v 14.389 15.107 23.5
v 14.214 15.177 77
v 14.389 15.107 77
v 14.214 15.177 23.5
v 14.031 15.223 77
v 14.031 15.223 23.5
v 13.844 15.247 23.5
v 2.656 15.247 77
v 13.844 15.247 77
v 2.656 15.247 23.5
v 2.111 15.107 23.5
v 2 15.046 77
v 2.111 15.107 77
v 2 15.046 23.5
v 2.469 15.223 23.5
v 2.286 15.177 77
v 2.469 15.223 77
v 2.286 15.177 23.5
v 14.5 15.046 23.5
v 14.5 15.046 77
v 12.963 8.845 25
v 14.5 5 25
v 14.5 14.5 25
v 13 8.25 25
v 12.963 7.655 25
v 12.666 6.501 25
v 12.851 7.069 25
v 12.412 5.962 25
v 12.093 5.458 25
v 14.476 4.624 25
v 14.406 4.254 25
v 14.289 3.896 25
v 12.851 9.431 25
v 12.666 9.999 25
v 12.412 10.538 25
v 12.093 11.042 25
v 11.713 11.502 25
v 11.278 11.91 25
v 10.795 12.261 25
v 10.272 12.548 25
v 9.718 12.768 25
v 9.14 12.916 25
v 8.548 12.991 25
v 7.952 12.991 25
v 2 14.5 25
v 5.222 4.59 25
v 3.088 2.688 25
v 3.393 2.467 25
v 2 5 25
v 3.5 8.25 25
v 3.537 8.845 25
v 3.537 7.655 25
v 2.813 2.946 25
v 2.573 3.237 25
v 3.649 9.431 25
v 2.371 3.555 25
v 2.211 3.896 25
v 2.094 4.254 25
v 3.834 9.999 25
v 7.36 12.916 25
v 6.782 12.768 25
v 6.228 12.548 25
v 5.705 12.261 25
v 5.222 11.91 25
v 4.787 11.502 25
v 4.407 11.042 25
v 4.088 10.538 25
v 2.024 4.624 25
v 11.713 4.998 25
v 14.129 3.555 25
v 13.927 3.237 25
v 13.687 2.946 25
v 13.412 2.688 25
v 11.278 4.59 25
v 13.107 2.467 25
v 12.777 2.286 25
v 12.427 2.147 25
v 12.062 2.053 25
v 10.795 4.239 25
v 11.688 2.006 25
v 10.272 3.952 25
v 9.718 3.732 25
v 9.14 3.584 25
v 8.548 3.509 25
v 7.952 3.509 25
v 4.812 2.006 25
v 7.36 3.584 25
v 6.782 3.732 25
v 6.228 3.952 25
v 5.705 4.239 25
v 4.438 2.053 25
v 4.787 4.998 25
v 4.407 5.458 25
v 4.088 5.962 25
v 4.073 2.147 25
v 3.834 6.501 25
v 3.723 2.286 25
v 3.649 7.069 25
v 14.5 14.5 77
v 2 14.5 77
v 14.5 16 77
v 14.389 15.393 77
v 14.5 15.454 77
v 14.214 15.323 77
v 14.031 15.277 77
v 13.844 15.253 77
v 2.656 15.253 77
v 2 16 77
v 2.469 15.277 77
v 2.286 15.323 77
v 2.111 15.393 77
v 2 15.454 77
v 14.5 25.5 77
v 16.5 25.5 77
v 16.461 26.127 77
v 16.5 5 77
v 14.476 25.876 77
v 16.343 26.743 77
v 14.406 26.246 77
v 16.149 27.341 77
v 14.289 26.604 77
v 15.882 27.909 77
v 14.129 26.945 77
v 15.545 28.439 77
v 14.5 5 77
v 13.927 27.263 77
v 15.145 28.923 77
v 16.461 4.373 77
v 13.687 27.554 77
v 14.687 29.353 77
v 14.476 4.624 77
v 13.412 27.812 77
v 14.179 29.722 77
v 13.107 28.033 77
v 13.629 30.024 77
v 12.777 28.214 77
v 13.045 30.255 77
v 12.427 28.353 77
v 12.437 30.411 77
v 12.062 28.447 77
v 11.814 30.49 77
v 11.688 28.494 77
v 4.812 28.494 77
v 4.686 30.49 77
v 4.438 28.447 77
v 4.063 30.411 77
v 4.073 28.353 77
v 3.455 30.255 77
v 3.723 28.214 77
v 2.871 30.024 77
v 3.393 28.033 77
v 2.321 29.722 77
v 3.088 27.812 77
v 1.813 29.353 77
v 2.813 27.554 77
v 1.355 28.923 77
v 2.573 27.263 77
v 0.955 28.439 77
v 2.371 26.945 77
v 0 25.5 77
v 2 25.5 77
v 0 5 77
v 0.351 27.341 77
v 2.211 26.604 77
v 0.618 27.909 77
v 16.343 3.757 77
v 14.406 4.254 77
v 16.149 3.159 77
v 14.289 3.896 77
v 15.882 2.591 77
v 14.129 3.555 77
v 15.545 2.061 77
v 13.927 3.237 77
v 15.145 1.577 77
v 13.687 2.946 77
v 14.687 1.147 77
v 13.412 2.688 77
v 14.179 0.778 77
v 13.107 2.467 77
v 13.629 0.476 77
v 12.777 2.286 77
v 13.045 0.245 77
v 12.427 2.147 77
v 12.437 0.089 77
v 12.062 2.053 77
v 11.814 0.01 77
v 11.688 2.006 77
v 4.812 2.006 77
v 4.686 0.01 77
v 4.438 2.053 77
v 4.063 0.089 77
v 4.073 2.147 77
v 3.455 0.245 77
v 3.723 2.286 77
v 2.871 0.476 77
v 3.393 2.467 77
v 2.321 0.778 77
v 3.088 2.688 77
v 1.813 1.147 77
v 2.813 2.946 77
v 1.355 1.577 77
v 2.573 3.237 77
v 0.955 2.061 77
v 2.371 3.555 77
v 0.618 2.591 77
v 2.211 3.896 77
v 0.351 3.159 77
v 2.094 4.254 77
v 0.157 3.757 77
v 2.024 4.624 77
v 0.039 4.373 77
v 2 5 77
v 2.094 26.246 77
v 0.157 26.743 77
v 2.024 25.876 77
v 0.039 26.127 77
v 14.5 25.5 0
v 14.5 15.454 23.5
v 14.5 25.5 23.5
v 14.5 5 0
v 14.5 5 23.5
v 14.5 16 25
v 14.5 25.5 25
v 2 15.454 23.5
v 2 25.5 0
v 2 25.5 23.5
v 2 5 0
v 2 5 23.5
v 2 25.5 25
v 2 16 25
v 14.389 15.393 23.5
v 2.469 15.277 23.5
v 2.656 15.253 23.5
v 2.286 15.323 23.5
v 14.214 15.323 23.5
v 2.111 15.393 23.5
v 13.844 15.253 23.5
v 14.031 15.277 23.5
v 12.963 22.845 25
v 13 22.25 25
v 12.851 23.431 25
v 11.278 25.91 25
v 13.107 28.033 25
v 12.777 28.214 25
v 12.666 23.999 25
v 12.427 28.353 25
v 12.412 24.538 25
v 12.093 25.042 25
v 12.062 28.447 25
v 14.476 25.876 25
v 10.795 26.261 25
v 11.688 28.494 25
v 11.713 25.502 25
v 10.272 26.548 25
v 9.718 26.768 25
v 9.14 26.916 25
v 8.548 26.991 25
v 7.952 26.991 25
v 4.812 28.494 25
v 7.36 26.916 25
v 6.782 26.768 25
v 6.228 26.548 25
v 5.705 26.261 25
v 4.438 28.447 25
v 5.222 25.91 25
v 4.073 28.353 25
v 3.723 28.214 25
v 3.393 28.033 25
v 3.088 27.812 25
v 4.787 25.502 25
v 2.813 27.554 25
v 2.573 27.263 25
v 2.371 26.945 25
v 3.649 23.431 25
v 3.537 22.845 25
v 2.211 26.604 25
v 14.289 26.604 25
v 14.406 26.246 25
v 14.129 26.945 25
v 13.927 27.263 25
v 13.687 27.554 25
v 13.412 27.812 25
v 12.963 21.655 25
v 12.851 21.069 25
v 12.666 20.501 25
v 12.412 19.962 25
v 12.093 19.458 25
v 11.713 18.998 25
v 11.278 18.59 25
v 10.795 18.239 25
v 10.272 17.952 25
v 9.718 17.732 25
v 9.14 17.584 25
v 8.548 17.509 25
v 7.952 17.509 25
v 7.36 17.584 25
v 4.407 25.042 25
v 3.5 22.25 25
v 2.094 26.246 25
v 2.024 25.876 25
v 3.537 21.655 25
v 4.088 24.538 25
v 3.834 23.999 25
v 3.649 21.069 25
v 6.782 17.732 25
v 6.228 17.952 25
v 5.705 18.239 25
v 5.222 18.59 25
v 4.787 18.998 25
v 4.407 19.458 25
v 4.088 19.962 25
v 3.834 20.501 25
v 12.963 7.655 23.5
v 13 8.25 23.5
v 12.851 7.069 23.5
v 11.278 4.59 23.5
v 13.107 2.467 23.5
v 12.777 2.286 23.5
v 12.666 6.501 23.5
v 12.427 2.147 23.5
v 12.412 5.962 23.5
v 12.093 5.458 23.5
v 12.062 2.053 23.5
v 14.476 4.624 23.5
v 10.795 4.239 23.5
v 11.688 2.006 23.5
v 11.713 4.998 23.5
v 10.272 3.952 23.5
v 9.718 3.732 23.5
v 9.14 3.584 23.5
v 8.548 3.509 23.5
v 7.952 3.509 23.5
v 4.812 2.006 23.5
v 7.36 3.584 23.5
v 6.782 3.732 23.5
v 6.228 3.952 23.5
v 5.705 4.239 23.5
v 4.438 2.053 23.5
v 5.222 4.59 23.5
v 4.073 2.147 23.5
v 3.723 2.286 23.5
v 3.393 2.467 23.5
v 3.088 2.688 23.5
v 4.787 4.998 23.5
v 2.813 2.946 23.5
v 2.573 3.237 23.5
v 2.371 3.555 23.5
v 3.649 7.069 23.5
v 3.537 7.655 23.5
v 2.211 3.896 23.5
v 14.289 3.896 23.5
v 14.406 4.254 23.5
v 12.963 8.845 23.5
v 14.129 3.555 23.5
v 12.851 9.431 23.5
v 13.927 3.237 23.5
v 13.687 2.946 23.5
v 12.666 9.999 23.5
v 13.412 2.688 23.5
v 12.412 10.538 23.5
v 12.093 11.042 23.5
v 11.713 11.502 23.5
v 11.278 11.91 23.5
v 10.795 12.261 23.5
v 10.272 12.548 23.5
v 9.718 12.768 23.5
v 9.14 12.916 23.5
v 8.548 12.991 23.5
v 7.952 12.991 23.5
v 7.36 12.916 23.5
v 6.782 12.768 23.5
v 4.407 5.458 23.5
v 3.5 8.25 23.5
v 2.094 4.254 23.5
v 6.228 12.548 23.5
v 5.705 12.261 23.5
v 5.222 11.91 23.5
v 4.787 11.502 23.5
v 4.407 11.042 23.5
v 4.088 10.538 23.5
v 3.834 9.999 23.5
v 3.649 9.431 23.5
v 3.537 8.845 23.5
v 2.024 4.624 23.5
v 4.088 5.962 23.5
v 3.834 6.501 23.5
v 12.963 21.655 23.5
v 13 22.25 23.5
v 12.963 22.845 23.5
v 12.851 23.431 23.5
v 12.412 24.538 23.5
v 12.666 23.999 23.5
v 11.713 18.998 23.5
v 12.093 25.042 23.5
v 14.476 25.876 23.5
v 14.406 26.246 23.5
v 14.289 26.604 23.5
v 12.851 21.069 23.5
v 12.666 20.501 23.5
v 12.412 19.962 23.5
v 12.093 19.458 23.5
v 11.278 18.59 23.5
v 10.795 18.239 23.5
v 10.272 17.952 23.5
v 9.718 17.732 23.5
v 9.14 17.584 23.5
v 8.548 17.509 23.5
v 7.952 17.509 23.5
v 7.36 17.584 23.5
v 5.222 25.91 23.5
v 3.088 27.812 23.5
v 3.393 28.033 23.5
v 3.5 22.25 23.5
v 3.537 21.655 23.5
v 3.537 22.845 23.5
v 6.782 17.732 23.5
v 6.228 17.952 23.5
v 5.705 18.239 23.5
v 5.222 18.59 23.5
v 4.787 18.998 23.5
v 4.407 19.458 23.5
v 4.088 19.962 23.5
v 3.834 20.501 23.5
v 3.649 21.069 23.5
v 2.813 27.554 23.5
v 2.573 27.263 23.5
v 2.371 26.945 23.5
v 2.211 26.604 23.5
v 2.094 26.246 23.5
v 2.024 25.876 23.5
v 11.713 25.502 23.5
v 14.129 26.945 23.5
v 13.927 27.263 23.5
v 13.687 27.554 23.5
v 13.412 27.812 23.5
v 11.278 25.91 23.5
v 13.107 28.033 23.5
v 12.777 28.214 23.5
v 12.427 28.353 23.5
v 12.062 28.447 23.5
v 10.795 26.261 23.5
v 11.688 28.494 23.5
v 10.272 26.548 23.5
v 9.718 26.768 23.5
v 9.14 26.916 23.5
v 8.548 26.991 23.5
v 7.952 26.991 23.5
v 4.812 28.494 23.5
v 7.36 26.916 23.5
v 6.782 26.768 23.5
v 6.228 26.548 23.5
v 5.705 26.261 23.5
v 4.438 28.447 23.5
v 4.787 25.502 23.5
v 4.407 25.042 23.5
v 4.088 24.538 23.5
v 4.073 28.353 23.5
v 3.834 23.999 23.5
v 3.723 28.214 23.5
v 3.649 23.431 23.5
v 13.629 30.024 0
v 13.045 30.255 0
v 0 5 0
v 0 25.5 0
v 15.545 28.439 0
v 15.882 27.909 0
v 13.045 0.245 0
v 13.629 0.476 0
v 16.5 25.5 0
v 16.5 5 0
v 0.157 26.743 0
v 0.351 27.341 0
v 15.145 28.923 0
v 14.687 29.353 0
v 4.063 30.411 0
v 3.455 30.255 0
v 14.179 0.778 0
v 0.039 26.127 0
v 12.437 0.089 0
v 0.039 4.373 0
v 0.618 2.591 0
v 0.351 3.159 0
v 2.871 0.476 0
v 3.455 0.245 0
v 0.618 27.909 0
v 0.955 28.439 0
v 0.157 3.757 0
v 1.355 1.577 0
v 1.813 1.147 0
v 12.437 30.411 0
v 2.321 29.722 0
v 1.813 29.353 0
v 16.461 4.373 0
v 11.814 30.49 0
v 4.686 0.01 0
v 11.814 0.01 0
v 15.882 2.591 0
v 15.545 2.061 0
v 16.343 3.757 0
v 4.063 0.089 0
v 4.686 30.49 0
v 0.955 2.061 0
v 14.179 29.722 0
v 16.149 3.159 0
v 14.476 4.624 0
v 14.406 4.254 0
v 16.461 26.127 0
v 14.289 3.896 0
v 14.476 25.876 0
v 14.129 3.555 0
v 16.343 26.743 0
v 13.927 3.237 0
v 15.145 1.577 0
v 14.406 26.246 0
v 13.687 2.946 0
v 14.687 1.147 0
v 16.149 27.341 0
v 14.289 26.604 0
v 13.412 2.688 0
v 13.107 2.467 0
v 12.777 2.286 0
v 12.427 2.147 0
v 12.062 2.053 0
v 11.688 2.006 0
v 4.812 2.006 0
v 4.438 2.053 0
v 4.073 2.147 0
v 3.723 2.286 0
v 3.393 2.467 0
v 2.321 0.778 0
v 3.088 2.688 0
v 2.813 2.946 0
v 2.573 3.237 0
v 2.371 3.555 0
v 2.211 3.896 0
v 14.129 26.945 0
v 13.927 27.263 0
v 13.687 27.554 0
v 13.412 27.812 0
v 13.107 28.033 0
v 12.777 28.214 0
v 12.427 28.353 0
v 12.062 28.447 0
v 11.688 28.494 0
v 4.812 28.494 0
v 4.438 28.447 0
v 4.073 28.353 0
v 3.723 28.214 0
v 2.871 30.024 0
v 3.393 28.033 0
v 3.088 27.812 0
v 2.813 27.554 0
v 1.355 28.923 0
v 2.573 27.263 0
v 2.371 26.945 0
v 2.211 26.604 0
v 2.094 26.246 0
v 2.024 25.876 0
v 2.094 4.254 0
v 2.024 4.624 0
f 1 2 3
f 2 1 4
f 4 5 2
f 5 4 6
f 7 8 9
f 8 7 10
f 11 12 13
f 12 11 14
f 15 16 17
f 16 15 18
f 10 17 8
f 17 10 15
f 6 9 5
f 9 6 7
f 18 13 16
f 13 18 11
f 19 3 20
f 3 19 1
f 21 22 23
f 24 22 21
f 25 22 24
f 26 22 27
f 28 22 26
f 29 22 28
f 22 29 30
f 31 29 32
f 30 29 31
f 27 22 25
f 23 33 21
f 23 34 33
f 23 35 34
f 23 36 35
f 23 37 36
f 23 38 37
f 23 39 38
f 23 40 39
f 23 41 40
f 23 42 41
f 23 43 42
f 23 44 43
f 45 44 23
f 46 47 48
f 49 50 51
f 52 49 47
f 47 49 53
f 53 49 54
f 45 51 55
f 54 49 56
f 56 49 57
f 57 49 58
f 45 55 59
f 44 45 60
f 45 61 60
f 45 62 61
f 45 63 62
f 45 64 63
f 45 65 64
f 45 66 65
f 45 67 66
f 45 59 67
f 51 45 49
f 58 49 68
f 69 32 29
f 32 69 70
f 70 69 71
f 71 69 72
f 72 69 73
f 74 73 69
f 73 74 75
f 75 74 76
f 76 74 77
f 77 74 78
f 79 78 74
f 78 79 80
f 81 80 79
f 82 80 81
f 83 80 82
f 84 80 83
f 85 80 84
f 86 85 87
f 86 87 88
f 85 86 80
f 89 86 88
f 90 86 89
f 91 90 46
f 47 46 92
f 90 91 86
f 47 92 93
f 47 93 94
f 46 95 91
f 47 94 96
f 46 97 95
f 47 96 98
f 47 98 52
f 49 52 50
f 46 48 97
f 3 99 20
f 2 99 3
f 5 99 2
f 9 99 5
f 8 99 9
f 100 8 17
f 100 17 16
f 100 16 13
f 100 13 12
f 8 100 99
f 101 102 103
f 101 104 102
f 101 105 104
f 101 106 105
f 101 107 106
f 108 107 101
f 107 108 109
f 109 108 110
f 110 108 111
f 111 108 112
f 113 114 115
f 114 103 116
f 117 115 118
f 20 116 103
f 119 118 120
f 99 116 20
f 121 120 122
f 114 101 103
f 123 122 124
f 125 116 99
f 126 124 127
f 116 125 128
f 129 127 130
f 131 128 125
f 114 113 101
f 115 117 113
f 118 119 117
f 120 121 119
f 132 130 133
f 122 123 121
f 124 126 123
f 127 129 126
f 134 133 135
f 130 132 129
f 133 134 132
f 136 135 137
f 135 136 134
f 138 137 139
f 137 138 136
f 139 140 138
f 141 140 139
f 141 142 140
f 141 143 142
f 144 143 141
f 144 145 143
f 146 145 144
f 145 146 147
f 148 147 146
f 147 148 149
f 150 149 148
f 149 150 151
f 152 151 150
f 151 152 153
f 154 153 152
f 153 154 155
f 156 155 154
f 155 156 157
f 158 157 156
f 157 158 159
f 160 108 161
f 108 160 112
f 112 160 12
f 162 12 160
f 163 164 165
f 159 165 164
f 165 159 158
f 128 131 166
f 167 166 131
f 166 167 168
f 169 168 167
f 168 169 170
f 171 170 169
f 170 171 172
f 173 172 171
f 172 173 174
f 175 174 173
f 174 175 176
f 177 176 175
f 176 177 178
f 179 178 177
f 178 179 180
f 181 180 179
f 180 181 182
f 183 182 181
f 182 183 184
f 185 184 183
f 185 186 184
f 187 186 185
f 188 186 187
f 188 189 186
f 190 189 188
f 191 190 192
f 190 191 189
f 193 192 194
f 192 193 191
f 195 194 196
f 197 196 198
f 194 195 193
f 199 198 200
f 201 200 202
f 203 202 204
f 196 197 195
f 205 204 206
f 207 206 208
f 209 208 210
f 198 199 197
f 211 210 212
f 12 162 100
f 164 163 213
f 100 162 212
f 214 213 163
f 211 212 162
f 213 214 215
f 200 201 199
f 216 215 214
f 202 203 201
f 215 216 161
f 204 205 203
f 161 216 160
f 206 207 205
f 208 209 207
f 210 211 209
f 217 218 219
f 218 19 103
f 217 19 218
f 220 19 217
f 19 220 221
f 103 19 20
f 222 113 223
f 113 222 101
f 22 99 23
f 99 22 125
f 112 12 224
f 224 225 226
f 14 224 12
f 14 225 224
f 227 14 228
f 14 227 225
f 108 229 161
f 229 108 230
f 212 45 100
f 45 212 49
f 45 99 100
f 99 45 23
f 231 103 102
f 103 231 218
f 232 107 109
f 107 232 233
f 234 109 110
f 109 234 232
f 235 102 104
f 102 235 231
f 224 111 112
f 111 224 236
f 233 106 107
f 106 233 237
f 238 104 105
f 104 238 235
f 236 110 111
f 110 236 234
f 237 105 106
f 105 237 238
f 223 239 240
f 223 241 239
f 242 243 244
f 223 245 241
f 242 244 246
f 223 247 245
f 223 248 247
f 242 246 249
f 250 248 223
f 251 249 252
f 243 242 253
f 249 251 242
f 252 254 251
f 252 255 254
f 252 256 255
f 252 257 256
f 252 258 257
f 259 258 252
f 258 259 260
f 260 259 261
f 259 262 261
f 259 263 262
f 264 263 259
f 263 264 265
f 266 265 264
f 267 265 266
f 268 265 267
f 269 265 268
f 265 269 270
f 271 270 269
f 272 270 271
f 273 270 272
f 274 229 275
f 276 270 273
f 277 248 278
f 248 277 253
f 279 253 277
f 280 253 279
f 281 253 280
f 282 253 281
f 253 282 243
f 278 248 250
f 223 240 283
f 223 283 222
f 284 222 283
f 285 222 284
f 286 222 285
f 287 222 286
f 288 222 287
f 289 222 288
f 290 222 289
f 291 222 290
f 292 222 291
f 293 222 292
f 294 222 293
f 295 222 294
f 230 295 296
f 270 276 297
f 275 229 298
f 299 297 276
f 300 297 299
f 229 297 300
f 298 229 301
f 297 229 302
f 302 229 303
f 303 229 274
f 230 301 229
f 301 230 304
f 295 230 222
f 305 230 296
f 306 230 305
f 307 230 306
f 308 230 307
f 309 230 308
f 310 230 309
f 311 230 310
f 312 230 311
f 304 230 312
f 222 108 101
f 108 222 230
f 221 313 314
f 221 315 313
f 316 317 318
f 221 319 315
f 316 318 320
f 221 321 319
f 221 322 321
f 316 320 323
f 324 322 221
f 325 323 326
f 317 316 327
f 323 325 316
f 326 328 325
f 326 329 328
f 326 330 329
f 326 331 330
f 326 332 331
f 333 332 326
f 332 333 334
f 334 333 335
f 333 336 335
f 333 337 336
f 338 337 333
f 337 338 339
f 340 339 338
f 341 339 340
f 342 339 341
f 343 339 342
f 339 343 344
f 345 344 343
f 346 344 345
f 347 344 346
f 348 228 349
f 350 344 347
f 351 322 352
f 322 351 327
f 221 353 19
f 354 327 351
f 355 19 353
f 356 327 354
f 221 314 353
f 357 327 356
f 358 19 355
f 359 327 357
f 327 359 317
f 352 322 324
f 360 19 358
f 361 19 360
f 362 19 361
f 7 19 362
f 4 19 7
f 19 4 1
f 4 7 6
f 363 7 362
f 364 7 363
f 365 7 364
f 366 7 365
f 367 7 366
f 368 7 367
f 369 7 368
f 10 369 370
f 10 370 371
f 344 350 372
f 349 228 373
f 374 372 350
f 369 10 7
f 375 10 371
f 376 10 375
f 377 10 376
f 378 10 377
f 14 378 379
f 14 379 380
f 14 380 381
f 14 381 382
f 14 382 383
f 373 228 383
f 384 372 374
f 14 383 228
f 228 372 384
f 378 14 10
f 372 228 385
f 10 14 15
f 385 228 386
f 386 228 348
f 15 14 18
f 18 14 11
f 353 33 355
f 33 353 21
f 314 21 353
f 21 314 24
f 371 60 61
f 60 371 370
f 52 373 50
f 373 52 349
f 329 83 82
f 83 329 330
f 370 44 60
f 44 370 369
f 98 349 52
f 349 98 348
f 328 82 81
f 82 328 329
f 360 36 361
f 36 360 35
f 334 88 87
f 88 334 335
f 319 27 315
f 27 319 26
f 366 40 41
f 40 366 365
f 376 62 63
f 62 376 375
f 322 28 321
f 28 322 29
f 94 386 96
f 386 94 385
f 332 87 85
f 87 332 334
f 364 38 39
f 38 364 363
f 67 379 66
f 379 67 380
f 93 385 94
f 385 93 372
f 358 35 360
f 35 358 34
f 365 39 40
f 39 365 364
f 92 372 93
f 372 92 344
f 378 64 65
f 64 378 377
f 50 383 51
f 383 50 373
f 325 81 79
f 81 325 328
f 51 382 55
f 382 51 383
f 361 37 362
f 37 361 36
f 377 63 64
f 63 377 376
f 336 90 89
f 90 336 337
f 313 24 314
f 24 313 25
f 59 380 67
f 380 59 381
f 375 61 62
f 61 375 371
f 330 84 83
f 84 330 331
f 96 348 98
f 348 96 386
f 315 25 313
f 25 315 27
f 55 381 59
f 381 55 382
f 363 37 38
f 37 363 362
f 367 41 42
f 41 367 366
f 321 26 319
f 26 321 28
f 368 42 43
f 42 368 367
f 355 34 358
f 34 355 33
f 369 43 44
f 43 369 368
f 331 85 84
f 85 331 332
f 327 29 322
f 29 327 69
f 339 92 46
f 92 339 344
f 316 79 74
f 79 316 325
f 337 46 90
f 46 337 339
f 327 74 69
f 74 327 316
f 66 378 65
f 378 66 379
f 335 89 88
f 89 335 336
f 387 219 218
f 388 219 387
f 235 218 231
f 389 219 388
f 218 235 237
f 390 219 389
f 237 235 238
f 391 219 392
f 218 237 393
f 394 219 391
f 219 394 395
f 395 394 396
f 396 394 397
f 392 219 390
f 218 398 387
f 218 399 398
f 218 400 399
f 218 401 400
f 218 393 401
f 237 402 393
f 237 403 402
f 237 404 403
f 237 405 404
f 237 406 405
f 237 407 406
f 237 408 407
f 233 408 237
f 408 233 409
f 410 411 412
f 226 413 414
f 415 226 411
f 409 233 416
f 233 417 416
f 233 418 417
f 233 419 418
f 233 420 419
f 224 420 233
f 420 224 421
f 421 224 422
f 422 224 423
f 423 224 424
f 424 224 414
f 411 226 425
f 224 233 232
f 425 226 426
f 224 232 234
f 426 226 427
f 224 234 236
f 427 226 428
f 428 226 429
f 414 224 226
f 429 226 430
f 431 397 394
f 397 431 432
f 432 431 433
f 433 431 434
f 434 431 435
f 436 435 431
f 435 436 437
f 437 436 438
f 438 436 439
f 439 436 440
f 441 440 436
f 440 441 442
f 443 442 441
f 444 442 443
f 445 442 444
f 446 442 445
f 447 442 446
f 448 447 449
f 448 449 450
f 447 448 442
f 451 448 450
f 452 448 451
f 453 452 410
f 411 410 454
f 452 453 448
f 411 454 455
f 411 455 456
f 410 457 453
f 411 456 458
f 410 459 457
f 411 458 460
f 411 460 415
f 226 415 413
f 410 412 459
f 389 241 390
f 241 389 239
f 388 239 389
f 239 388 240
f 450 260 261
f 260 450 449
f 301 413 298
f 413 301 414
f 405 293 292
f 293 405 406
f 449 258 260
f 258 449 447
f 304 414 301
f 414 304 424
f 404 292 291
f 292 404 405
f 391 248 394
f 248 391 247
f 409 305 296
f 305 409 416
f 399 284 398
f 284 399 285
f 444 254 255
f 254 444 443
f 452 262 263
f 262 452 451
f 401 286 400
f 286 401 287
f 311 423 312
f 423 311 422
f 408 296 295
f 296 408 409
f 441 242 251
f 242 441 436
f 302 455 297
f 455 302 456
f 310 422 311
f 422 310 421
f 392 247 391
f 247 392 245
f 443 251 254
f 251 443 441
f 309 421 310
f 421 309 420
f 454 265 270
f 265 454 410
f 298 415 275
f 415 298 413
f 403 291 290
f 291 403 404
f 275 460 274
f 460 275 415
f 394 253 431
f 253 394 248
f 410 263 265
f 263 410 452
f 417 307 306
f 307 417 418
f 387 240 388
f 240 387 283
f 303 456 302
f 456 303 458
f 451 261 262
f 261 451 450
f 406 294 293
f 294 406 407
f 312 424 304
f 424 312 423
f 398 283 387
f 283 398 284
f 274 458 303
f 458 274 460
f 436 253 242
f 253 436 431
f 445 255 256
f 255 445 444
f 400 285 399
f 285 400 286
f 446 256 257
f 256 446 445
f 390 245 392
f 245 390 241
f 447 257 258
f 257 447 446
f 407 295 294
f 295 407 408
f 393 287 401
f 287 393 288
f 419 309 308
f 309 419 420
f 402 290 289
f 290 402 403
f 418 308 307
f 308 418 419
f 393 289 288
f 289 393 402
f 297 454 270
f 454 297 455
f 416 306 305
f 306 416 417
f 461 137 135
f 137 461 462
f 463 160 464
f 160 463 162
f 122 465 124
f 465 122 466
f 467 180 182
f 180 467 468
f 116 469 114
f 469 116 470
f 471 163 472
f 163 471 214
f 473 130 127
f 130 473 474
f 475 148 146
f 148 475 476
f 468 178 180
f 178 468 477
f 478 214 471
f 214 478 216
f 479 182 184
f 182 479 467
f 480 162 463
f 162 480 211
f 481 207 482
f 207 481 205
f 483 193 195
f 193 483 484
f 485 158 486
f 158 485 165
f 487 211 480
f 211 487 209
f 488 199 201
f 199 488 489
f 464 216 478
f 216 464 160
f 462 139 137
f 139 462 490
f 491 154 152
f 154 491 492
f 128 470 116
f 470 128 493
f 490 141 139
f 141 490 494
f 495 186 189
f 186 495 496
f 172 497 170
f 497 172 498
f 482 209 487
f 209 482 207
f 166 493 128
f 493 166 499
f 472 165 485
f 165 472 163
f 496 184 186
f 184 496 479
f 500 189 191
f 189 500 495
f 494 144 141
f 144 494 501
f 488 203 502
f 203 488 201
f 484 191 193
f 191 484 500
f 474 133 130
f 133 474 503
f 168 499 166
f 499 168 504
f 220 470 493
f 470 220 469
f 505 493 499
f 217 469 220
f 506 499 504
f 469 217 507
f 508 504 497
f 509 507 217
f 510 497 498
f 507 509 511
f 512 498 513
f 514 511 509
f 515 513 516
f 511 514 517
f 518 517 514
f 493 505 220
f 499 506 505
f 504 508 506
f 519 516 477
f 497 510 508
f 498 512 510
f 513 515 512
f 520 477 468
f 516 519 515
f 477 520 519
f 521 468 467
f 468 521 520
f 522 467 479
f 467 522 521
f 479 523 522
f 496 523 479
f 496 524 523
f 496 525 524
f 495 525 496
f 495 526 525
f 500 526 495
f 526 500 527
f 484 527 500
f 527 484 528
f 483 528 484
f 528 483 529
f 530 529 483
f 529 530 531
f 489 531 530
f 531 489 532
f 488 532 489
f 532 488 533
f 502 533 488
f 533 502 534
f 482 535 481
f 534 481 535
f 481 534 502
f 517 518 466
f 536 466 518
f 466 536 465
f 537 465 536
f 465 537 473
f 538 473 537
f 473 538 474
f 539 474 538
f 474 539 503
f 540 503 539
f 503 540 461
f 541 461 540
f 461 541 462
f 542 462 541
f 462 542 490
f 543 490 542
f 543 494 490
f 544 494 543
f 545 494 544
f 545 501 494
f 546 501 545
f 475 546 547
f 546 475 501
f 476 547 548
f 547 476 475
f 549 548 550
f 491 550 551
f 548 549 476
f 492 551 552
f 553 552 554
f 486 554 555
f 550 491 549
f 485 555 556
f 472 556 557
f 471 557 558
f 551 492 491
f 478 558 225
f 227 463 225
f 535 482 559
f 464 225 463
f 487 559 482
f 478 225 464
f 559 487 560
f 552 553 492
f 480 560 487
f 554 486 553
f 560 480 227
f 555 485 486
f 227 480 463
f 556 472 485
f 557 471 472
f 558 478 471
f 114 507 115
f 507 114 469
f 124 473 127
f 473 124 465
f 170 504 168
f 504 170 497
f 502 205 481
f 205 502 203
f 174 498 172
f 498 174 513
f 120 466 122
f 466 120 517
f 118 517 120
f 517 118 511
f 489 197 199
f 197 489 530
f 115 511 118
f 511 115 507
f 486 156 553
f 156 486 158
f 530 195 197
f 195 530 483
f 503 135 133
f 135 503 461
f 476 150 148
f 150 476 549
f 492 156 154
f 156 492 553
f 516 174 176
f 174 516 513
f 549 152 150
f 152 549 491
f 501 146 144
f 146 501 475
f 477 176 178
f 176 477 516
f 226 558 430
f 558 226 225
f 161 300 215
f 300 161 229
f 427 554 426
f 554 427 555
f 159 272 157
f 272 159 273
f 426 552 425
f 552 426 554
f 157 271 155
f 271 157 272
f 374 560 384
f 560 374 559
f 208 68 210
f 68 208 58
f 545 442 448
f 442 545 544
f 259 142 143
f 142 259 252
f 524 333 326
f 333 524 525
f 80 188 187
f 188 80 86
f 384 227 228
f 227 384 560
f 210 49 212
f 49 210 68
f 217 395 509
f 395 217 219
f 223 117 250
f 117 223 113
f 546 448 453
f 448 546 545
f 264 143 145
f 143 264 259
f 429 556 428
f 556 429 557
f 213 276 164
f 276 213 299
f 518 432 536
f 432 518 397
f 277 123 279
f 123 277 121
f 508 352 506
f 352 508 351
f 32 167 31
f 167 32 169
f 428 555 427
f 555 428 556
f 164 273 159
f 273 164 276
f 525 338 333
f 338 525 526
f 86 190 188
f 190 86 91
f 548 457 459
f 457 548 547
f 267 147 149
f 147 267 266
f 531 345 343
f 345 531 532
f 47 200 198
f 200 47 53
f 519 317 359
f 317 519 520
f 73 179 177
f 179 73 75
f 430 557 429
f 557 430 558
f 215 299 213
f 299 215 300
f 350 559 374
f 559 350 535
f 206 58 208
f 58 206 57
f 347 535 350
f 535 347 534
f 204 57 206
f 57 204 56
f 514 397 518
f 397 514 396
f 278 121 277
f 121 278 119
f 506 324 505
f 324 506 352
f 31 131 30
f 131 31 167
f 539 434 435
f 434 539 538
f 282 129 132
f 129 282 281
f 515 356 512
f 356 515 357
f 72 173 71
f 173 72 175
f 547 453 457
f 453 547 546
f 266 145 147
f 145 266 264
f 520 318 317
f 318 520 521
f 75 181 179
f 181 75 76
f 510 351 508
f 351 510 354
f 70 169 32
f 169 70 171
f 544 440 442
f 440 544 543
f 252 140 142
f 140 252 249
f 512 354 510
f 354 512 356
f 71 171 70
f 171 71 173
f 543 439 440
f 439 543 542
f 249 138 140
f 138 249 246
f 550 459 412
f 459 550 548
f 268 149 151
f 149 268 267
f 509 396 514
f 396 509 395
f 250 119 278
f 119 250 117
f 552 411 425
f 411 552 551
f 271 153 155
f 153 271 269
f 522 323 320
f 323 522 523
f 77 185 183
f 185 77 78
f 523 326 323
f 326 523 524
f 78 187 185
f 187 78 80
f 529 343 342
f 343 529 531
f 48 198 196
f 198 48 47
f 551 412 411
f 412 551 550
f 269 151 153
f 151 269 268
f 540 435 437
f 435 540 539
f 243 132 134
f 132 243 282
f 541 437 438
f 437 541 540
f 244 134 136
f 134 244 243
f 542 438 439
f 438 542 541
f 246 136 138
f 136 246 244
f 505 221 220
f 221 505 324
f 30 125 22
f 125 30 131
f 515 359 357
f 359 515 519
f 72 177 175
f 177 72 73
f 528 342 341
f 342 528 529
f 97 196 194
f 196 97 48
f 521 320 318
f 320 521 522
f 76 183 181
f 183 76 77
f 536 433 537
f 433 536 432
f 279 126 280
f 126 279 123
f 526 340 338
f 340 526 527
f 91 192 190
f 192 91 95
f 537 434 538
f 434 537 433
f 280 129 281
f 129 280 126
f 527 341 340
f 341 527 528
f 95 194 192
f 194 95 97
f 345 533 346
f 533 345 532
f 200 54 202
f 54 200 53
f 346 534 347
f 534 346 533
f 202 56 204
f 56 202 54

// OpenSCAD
// Ammo Case
// for Freddie
//
// All measurements should be in mm.

$fn = 50;


rows = 1;                 // Number of spaces horizontally
columns = 2;             // Number of spaces vertically


width = 12.5;             // Internal width of a space. All spaces are square.
height = 77.0;            // Total height of the case. This should probably 
                          // the total  height of the bullet + a bit.
depth = 52.0;             // Depth of the hole you drop the bullet into.

wall_thickness = 1.5;     // Thickness of the walls
outer_wall_thickness = 2.0;   // Thickness of the outer walls

hole_diameter = 9.5;      // Diameter of the hole the tip of the bullet should
                          // go through. 

rounded_corners = true;
outer_corner_radius = 5;


// NOT YET IMPLEMENTED

bottom_corners_inverted = false;  // Should the lower corners be inverted?

structural_bracing = false;        // Include structural bracing?
bracing_row_freq = 1;             // How frequently to have a brace on rows
bracing_col_freq = 1;             // How frequently to have a brace on columns


module AmmoCase () {
  h_offset = (width / 2) + outer_wall_thickness;
  
  translate([h_offset, h_offset, 0]) {
    
    union() {    
      translate([0, 0, depth / 2 + height - depth]) hollow_square_block_section(width, wall_thickness, depth, rows, columns);
        
      translate([0, 0, height - depth - wall_thickness / 2]) midplate(width, wall_thickness, hole_diameter, rows, columns);      
      
      translate([0, 0, height / 2]) casing (width, wall_thickness, outer_wall_thickness, height, rows, columns);
        
    }
  }
}


// Extruded grid
module hollow_square_block_section (internal_width, wall_thickness, height, rows, cols) {
  total_width = internal_width + wall_thickness;
  
  module hollow_square_block () {
    difference() {
      rounded_cube([total_width, total_width, height], radius = wall_thickness, center = true);
      cube([internal_width, internal_width, height + 2], center = true);
    }
  }
  
  for (row = [0:rows-1]) {
    for (col = [0:cols-1]) {
      translate([row * total_width, col * total_width, 0]) hollow_square_block();
    }
  }
}

// Flat plate with holes
module midplate (internal_width, wall_thickness, hole_diameter, rows, cols) {
  total_width = internal_width + wall_thickness;
  
  module single_midplate () {
    difference() {
      rounded_cube([total_width, total_width, wall_thickness], radius = wall_thickness, center = true);
      cylinder(wall_thickness+2, d = hole_diameter, center = true);
    }
  }
  
   for (row = [0:rows-1]) {
    for (col = [0:cols-1]) {
      translate([row * total_width, col * total_width, 0]) single_midplate();
    }
  }
}

module casing (internal_width, inner_wall_thickness, outer_wall_thickness, total_height, rows, cols) {
  total_internal_width = (internal_width + inner_wall_thickness) * rows - inner_wall_thickness;
  total_internal_length = (internal_width + inner_wall_thickness) * cols - inner_wall_thickness;
  
  external_width = total_internal_width + (outer_wall_thickness * 2);
  external_length = total_internal_length + (outer_wall_thickness * 2);
  
  inner_corner_radius = outer_corner_radius - outer_wall_thickness;
  if (inner_corner_radius < 0) {
    inner_corner_radius = outer_corner_radius;
  }
  
  translate([(external_width - internal_width) / 2 - outer_wall_thickness, (external_length - internal_width) / 2 - outer_wall_thickness, 0]) difference() {
      rounded_cube([external_width, external_length, total_height], center = true);
      rounded_cube([total_internal_width, total_internal_length, total_height + 2], radius = inner_corner_radius, center = true);
  }
}

module rounded_cube (dimensions, radius = outer_corner_radius, center = false) {
  module corner() {
    cylinder(dimensions[2], r = radius);
  }
  
  module rc_helper() {
    hull() {
      translate([radius, radius, 0]) corner();
      translate([dimensions[0]-radius, radius, 0]) corner();
    
      translate([radius, dimensions[1]-radius, 0]) corner();
      translate([dimensions[0]-radius, dimensions[1]-radius, 0]) corner();
    }
  }
  
  if (rounded_corners) {
    if (center) {
      translate([-dimensions[0]/2, -dimensions[1]/2, -dimensions[2]/2]) rc_helper();
    } else {
      rc_helper();
    }
  } else {
    cube(dimensions, center = center);
  }
}

AmmoCase();
